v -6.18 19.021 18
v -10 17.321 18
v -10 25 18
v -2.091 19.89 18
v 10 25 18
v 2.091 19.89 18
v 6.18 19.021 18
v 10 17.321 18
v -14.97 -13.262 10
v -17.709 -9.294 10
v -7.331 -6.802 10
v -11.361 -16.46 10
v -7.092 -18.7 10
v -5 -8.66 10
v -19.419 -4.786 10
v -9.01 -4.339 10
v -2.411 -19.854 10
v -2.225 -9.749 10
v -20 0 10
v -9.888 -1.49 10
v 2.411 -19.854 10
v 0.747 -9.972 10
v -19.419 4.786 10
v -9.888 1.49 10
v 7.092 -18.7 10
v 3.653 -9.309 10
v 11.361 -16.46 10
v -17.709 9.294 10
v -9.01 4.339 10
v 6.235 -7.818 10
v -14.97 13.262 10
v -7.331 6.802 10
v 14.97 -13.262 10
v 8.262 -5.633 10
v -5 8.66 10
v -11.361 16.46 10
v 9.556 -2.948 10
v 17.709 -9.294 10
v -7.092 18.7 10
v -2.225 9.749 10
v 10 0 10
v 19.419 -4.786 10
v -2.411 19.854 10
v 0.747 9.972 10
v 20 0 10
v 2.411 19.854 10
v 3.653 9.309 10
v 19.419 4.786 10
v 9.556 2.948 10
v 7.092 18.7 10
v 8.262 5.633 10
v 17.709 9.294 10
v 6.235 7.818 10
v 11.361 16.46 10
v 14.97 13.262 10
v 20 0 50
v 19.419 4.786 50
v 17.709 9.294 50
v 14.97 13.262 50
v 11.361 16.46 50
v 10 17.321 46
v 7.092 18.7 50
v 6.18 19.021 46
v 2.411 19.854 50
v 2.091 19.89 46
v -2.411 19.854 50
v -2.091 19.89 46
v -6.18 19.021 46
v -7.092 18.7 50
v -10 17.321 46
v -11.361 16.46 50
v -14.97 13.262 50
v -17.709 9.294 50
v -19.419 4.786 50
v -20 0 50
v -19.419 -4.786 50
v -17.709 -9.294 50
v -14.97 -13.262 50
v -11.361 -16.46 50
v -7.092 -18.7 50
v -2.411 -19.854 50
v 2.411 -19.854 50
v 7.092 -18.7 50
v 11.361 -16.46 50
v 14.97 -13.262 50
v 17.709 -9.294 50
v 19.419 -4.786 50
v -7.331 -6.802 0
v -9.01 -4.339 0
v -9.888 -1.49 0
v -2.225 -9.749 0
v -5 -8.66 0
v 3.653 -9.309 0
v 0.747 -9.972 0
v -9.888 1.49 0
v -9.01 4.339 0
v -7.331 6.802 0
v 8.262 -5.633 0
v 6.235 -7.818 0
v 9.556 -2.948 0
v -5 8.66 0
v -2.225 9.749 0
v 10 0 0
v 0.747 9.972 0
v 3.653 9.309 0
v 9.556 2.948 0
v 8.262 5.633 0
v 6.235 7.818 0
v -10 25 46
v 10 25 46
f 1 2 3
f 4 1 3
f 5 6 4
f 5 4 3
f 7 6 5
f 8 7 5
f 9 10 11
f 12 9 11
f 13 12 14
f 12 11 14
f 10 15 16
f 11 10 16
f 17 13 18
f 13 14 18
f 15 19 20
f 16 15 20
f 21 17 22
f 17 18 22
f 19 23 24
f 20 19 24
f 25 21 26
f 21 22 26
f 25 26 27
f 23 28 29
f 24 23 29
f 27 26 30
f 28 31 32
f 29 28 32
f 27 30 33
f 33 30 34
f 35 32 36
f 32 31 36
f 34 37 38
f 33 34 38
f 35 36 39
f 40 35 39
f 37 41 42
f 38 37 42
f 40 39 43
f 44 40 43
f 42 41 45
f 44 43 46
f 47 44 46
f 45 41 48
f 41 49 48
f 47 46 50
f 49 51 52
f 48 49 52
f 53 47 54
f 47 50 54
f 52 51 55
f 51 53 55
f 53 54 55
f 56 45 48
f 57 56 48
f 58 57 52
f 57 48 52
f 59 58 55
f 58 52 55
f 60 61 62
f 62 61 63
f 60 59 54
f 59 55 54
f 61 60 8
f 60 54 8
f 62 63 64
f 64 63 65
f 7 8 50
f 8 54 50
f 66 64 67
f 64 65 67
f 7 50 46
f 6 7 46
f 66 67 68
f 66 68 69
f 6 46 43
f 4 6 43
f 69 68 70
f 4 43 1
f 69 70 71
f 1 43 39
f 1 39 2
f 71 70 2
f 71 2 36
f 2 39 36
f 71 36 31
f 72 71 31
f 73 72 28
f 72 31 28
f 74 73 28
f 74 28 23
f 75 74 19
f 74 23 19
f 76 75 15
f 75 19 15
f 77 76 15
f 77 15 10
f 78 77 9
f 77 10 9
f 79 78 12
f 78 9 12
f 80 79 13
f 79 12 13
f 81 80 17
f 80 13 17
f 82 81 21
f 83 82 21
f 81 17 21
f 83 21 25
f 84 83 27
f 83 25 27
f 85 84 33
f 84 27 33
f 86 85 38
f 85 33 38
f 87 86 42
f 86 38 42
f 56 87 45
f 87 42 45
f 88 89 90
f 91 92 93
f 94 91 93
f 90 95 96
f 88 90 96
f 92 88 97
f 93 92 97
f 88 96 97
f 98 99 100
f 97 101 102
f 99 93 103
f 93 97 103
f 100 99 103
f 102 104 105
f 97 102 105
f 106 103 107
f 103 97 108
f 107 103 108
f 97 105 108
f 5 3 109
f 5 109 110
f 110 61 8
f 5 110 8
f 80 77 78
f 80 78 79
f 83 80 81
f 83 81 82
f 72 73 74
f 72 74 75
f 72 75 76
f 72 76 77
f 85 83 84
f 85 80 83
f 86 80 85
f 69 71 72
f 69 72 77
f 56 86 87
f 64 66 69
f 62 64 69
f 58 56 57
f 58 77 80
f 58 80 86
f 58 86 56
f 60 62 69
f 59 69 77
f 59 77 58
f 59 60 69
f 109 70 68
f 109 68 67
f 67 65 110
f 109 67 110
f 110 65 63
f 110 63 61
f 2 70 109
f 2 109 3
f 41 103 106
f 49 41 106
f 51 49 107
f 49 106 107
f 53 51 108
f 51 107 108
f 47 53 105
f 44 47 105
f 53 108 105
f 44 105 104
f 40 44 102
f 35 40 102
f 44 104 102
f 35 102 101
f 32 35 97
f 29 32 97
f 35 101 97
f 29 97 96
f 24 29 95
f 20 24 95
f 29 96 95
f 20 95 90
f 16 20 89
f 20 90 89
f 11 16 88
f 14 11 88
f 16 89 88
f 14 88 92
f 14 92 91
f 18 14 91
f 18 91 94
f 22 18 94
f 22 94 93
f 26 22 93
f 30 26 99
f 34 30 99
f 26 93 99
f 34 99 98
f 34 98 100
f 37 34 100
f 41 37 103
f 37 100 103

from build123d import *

# Parameters (mm, degrees)
SKETCH_1_R      = 10
EXTRUDE_1_DEPTH = 10
SKETCH_2_R      = 20
EXTRUDE_2_DEPTH = 40
SKETCH_3_W      = 20
SKETCH_3_H      = 28
EXTRUDE_3_DEPTH = 25


with BuildPart() as part:
    # 草图1 → 凸台-拉伸1 (new body)
    with BuildSketch(Plane.XY):
        Circle(SKETCH_1_R)
    extrude(amount=EXTRUDE_1_DEPTH)

    # 草图2 → 凸台-拉伸2 (add)
    with BuildSketch(Plane.XY.offset(10)):
        Circle(SKETCH_2_R)
    extrude(amount=EXTRUDE_2_DEPTH)

    # 草图3 → 凸台-拉伸3 (add)
    with BuildSketch(Plane(origin=(0, 0, 0), x_dir=(1, 0, 0), z_dir=(0, 1, 0))):
        with Locations((0, -32)):
            Rectangle(SKETCH_3_W, SKETCH_3_H)
    extrude(amount=EXTRUDE_3_DEPTH)


solid = part.part
